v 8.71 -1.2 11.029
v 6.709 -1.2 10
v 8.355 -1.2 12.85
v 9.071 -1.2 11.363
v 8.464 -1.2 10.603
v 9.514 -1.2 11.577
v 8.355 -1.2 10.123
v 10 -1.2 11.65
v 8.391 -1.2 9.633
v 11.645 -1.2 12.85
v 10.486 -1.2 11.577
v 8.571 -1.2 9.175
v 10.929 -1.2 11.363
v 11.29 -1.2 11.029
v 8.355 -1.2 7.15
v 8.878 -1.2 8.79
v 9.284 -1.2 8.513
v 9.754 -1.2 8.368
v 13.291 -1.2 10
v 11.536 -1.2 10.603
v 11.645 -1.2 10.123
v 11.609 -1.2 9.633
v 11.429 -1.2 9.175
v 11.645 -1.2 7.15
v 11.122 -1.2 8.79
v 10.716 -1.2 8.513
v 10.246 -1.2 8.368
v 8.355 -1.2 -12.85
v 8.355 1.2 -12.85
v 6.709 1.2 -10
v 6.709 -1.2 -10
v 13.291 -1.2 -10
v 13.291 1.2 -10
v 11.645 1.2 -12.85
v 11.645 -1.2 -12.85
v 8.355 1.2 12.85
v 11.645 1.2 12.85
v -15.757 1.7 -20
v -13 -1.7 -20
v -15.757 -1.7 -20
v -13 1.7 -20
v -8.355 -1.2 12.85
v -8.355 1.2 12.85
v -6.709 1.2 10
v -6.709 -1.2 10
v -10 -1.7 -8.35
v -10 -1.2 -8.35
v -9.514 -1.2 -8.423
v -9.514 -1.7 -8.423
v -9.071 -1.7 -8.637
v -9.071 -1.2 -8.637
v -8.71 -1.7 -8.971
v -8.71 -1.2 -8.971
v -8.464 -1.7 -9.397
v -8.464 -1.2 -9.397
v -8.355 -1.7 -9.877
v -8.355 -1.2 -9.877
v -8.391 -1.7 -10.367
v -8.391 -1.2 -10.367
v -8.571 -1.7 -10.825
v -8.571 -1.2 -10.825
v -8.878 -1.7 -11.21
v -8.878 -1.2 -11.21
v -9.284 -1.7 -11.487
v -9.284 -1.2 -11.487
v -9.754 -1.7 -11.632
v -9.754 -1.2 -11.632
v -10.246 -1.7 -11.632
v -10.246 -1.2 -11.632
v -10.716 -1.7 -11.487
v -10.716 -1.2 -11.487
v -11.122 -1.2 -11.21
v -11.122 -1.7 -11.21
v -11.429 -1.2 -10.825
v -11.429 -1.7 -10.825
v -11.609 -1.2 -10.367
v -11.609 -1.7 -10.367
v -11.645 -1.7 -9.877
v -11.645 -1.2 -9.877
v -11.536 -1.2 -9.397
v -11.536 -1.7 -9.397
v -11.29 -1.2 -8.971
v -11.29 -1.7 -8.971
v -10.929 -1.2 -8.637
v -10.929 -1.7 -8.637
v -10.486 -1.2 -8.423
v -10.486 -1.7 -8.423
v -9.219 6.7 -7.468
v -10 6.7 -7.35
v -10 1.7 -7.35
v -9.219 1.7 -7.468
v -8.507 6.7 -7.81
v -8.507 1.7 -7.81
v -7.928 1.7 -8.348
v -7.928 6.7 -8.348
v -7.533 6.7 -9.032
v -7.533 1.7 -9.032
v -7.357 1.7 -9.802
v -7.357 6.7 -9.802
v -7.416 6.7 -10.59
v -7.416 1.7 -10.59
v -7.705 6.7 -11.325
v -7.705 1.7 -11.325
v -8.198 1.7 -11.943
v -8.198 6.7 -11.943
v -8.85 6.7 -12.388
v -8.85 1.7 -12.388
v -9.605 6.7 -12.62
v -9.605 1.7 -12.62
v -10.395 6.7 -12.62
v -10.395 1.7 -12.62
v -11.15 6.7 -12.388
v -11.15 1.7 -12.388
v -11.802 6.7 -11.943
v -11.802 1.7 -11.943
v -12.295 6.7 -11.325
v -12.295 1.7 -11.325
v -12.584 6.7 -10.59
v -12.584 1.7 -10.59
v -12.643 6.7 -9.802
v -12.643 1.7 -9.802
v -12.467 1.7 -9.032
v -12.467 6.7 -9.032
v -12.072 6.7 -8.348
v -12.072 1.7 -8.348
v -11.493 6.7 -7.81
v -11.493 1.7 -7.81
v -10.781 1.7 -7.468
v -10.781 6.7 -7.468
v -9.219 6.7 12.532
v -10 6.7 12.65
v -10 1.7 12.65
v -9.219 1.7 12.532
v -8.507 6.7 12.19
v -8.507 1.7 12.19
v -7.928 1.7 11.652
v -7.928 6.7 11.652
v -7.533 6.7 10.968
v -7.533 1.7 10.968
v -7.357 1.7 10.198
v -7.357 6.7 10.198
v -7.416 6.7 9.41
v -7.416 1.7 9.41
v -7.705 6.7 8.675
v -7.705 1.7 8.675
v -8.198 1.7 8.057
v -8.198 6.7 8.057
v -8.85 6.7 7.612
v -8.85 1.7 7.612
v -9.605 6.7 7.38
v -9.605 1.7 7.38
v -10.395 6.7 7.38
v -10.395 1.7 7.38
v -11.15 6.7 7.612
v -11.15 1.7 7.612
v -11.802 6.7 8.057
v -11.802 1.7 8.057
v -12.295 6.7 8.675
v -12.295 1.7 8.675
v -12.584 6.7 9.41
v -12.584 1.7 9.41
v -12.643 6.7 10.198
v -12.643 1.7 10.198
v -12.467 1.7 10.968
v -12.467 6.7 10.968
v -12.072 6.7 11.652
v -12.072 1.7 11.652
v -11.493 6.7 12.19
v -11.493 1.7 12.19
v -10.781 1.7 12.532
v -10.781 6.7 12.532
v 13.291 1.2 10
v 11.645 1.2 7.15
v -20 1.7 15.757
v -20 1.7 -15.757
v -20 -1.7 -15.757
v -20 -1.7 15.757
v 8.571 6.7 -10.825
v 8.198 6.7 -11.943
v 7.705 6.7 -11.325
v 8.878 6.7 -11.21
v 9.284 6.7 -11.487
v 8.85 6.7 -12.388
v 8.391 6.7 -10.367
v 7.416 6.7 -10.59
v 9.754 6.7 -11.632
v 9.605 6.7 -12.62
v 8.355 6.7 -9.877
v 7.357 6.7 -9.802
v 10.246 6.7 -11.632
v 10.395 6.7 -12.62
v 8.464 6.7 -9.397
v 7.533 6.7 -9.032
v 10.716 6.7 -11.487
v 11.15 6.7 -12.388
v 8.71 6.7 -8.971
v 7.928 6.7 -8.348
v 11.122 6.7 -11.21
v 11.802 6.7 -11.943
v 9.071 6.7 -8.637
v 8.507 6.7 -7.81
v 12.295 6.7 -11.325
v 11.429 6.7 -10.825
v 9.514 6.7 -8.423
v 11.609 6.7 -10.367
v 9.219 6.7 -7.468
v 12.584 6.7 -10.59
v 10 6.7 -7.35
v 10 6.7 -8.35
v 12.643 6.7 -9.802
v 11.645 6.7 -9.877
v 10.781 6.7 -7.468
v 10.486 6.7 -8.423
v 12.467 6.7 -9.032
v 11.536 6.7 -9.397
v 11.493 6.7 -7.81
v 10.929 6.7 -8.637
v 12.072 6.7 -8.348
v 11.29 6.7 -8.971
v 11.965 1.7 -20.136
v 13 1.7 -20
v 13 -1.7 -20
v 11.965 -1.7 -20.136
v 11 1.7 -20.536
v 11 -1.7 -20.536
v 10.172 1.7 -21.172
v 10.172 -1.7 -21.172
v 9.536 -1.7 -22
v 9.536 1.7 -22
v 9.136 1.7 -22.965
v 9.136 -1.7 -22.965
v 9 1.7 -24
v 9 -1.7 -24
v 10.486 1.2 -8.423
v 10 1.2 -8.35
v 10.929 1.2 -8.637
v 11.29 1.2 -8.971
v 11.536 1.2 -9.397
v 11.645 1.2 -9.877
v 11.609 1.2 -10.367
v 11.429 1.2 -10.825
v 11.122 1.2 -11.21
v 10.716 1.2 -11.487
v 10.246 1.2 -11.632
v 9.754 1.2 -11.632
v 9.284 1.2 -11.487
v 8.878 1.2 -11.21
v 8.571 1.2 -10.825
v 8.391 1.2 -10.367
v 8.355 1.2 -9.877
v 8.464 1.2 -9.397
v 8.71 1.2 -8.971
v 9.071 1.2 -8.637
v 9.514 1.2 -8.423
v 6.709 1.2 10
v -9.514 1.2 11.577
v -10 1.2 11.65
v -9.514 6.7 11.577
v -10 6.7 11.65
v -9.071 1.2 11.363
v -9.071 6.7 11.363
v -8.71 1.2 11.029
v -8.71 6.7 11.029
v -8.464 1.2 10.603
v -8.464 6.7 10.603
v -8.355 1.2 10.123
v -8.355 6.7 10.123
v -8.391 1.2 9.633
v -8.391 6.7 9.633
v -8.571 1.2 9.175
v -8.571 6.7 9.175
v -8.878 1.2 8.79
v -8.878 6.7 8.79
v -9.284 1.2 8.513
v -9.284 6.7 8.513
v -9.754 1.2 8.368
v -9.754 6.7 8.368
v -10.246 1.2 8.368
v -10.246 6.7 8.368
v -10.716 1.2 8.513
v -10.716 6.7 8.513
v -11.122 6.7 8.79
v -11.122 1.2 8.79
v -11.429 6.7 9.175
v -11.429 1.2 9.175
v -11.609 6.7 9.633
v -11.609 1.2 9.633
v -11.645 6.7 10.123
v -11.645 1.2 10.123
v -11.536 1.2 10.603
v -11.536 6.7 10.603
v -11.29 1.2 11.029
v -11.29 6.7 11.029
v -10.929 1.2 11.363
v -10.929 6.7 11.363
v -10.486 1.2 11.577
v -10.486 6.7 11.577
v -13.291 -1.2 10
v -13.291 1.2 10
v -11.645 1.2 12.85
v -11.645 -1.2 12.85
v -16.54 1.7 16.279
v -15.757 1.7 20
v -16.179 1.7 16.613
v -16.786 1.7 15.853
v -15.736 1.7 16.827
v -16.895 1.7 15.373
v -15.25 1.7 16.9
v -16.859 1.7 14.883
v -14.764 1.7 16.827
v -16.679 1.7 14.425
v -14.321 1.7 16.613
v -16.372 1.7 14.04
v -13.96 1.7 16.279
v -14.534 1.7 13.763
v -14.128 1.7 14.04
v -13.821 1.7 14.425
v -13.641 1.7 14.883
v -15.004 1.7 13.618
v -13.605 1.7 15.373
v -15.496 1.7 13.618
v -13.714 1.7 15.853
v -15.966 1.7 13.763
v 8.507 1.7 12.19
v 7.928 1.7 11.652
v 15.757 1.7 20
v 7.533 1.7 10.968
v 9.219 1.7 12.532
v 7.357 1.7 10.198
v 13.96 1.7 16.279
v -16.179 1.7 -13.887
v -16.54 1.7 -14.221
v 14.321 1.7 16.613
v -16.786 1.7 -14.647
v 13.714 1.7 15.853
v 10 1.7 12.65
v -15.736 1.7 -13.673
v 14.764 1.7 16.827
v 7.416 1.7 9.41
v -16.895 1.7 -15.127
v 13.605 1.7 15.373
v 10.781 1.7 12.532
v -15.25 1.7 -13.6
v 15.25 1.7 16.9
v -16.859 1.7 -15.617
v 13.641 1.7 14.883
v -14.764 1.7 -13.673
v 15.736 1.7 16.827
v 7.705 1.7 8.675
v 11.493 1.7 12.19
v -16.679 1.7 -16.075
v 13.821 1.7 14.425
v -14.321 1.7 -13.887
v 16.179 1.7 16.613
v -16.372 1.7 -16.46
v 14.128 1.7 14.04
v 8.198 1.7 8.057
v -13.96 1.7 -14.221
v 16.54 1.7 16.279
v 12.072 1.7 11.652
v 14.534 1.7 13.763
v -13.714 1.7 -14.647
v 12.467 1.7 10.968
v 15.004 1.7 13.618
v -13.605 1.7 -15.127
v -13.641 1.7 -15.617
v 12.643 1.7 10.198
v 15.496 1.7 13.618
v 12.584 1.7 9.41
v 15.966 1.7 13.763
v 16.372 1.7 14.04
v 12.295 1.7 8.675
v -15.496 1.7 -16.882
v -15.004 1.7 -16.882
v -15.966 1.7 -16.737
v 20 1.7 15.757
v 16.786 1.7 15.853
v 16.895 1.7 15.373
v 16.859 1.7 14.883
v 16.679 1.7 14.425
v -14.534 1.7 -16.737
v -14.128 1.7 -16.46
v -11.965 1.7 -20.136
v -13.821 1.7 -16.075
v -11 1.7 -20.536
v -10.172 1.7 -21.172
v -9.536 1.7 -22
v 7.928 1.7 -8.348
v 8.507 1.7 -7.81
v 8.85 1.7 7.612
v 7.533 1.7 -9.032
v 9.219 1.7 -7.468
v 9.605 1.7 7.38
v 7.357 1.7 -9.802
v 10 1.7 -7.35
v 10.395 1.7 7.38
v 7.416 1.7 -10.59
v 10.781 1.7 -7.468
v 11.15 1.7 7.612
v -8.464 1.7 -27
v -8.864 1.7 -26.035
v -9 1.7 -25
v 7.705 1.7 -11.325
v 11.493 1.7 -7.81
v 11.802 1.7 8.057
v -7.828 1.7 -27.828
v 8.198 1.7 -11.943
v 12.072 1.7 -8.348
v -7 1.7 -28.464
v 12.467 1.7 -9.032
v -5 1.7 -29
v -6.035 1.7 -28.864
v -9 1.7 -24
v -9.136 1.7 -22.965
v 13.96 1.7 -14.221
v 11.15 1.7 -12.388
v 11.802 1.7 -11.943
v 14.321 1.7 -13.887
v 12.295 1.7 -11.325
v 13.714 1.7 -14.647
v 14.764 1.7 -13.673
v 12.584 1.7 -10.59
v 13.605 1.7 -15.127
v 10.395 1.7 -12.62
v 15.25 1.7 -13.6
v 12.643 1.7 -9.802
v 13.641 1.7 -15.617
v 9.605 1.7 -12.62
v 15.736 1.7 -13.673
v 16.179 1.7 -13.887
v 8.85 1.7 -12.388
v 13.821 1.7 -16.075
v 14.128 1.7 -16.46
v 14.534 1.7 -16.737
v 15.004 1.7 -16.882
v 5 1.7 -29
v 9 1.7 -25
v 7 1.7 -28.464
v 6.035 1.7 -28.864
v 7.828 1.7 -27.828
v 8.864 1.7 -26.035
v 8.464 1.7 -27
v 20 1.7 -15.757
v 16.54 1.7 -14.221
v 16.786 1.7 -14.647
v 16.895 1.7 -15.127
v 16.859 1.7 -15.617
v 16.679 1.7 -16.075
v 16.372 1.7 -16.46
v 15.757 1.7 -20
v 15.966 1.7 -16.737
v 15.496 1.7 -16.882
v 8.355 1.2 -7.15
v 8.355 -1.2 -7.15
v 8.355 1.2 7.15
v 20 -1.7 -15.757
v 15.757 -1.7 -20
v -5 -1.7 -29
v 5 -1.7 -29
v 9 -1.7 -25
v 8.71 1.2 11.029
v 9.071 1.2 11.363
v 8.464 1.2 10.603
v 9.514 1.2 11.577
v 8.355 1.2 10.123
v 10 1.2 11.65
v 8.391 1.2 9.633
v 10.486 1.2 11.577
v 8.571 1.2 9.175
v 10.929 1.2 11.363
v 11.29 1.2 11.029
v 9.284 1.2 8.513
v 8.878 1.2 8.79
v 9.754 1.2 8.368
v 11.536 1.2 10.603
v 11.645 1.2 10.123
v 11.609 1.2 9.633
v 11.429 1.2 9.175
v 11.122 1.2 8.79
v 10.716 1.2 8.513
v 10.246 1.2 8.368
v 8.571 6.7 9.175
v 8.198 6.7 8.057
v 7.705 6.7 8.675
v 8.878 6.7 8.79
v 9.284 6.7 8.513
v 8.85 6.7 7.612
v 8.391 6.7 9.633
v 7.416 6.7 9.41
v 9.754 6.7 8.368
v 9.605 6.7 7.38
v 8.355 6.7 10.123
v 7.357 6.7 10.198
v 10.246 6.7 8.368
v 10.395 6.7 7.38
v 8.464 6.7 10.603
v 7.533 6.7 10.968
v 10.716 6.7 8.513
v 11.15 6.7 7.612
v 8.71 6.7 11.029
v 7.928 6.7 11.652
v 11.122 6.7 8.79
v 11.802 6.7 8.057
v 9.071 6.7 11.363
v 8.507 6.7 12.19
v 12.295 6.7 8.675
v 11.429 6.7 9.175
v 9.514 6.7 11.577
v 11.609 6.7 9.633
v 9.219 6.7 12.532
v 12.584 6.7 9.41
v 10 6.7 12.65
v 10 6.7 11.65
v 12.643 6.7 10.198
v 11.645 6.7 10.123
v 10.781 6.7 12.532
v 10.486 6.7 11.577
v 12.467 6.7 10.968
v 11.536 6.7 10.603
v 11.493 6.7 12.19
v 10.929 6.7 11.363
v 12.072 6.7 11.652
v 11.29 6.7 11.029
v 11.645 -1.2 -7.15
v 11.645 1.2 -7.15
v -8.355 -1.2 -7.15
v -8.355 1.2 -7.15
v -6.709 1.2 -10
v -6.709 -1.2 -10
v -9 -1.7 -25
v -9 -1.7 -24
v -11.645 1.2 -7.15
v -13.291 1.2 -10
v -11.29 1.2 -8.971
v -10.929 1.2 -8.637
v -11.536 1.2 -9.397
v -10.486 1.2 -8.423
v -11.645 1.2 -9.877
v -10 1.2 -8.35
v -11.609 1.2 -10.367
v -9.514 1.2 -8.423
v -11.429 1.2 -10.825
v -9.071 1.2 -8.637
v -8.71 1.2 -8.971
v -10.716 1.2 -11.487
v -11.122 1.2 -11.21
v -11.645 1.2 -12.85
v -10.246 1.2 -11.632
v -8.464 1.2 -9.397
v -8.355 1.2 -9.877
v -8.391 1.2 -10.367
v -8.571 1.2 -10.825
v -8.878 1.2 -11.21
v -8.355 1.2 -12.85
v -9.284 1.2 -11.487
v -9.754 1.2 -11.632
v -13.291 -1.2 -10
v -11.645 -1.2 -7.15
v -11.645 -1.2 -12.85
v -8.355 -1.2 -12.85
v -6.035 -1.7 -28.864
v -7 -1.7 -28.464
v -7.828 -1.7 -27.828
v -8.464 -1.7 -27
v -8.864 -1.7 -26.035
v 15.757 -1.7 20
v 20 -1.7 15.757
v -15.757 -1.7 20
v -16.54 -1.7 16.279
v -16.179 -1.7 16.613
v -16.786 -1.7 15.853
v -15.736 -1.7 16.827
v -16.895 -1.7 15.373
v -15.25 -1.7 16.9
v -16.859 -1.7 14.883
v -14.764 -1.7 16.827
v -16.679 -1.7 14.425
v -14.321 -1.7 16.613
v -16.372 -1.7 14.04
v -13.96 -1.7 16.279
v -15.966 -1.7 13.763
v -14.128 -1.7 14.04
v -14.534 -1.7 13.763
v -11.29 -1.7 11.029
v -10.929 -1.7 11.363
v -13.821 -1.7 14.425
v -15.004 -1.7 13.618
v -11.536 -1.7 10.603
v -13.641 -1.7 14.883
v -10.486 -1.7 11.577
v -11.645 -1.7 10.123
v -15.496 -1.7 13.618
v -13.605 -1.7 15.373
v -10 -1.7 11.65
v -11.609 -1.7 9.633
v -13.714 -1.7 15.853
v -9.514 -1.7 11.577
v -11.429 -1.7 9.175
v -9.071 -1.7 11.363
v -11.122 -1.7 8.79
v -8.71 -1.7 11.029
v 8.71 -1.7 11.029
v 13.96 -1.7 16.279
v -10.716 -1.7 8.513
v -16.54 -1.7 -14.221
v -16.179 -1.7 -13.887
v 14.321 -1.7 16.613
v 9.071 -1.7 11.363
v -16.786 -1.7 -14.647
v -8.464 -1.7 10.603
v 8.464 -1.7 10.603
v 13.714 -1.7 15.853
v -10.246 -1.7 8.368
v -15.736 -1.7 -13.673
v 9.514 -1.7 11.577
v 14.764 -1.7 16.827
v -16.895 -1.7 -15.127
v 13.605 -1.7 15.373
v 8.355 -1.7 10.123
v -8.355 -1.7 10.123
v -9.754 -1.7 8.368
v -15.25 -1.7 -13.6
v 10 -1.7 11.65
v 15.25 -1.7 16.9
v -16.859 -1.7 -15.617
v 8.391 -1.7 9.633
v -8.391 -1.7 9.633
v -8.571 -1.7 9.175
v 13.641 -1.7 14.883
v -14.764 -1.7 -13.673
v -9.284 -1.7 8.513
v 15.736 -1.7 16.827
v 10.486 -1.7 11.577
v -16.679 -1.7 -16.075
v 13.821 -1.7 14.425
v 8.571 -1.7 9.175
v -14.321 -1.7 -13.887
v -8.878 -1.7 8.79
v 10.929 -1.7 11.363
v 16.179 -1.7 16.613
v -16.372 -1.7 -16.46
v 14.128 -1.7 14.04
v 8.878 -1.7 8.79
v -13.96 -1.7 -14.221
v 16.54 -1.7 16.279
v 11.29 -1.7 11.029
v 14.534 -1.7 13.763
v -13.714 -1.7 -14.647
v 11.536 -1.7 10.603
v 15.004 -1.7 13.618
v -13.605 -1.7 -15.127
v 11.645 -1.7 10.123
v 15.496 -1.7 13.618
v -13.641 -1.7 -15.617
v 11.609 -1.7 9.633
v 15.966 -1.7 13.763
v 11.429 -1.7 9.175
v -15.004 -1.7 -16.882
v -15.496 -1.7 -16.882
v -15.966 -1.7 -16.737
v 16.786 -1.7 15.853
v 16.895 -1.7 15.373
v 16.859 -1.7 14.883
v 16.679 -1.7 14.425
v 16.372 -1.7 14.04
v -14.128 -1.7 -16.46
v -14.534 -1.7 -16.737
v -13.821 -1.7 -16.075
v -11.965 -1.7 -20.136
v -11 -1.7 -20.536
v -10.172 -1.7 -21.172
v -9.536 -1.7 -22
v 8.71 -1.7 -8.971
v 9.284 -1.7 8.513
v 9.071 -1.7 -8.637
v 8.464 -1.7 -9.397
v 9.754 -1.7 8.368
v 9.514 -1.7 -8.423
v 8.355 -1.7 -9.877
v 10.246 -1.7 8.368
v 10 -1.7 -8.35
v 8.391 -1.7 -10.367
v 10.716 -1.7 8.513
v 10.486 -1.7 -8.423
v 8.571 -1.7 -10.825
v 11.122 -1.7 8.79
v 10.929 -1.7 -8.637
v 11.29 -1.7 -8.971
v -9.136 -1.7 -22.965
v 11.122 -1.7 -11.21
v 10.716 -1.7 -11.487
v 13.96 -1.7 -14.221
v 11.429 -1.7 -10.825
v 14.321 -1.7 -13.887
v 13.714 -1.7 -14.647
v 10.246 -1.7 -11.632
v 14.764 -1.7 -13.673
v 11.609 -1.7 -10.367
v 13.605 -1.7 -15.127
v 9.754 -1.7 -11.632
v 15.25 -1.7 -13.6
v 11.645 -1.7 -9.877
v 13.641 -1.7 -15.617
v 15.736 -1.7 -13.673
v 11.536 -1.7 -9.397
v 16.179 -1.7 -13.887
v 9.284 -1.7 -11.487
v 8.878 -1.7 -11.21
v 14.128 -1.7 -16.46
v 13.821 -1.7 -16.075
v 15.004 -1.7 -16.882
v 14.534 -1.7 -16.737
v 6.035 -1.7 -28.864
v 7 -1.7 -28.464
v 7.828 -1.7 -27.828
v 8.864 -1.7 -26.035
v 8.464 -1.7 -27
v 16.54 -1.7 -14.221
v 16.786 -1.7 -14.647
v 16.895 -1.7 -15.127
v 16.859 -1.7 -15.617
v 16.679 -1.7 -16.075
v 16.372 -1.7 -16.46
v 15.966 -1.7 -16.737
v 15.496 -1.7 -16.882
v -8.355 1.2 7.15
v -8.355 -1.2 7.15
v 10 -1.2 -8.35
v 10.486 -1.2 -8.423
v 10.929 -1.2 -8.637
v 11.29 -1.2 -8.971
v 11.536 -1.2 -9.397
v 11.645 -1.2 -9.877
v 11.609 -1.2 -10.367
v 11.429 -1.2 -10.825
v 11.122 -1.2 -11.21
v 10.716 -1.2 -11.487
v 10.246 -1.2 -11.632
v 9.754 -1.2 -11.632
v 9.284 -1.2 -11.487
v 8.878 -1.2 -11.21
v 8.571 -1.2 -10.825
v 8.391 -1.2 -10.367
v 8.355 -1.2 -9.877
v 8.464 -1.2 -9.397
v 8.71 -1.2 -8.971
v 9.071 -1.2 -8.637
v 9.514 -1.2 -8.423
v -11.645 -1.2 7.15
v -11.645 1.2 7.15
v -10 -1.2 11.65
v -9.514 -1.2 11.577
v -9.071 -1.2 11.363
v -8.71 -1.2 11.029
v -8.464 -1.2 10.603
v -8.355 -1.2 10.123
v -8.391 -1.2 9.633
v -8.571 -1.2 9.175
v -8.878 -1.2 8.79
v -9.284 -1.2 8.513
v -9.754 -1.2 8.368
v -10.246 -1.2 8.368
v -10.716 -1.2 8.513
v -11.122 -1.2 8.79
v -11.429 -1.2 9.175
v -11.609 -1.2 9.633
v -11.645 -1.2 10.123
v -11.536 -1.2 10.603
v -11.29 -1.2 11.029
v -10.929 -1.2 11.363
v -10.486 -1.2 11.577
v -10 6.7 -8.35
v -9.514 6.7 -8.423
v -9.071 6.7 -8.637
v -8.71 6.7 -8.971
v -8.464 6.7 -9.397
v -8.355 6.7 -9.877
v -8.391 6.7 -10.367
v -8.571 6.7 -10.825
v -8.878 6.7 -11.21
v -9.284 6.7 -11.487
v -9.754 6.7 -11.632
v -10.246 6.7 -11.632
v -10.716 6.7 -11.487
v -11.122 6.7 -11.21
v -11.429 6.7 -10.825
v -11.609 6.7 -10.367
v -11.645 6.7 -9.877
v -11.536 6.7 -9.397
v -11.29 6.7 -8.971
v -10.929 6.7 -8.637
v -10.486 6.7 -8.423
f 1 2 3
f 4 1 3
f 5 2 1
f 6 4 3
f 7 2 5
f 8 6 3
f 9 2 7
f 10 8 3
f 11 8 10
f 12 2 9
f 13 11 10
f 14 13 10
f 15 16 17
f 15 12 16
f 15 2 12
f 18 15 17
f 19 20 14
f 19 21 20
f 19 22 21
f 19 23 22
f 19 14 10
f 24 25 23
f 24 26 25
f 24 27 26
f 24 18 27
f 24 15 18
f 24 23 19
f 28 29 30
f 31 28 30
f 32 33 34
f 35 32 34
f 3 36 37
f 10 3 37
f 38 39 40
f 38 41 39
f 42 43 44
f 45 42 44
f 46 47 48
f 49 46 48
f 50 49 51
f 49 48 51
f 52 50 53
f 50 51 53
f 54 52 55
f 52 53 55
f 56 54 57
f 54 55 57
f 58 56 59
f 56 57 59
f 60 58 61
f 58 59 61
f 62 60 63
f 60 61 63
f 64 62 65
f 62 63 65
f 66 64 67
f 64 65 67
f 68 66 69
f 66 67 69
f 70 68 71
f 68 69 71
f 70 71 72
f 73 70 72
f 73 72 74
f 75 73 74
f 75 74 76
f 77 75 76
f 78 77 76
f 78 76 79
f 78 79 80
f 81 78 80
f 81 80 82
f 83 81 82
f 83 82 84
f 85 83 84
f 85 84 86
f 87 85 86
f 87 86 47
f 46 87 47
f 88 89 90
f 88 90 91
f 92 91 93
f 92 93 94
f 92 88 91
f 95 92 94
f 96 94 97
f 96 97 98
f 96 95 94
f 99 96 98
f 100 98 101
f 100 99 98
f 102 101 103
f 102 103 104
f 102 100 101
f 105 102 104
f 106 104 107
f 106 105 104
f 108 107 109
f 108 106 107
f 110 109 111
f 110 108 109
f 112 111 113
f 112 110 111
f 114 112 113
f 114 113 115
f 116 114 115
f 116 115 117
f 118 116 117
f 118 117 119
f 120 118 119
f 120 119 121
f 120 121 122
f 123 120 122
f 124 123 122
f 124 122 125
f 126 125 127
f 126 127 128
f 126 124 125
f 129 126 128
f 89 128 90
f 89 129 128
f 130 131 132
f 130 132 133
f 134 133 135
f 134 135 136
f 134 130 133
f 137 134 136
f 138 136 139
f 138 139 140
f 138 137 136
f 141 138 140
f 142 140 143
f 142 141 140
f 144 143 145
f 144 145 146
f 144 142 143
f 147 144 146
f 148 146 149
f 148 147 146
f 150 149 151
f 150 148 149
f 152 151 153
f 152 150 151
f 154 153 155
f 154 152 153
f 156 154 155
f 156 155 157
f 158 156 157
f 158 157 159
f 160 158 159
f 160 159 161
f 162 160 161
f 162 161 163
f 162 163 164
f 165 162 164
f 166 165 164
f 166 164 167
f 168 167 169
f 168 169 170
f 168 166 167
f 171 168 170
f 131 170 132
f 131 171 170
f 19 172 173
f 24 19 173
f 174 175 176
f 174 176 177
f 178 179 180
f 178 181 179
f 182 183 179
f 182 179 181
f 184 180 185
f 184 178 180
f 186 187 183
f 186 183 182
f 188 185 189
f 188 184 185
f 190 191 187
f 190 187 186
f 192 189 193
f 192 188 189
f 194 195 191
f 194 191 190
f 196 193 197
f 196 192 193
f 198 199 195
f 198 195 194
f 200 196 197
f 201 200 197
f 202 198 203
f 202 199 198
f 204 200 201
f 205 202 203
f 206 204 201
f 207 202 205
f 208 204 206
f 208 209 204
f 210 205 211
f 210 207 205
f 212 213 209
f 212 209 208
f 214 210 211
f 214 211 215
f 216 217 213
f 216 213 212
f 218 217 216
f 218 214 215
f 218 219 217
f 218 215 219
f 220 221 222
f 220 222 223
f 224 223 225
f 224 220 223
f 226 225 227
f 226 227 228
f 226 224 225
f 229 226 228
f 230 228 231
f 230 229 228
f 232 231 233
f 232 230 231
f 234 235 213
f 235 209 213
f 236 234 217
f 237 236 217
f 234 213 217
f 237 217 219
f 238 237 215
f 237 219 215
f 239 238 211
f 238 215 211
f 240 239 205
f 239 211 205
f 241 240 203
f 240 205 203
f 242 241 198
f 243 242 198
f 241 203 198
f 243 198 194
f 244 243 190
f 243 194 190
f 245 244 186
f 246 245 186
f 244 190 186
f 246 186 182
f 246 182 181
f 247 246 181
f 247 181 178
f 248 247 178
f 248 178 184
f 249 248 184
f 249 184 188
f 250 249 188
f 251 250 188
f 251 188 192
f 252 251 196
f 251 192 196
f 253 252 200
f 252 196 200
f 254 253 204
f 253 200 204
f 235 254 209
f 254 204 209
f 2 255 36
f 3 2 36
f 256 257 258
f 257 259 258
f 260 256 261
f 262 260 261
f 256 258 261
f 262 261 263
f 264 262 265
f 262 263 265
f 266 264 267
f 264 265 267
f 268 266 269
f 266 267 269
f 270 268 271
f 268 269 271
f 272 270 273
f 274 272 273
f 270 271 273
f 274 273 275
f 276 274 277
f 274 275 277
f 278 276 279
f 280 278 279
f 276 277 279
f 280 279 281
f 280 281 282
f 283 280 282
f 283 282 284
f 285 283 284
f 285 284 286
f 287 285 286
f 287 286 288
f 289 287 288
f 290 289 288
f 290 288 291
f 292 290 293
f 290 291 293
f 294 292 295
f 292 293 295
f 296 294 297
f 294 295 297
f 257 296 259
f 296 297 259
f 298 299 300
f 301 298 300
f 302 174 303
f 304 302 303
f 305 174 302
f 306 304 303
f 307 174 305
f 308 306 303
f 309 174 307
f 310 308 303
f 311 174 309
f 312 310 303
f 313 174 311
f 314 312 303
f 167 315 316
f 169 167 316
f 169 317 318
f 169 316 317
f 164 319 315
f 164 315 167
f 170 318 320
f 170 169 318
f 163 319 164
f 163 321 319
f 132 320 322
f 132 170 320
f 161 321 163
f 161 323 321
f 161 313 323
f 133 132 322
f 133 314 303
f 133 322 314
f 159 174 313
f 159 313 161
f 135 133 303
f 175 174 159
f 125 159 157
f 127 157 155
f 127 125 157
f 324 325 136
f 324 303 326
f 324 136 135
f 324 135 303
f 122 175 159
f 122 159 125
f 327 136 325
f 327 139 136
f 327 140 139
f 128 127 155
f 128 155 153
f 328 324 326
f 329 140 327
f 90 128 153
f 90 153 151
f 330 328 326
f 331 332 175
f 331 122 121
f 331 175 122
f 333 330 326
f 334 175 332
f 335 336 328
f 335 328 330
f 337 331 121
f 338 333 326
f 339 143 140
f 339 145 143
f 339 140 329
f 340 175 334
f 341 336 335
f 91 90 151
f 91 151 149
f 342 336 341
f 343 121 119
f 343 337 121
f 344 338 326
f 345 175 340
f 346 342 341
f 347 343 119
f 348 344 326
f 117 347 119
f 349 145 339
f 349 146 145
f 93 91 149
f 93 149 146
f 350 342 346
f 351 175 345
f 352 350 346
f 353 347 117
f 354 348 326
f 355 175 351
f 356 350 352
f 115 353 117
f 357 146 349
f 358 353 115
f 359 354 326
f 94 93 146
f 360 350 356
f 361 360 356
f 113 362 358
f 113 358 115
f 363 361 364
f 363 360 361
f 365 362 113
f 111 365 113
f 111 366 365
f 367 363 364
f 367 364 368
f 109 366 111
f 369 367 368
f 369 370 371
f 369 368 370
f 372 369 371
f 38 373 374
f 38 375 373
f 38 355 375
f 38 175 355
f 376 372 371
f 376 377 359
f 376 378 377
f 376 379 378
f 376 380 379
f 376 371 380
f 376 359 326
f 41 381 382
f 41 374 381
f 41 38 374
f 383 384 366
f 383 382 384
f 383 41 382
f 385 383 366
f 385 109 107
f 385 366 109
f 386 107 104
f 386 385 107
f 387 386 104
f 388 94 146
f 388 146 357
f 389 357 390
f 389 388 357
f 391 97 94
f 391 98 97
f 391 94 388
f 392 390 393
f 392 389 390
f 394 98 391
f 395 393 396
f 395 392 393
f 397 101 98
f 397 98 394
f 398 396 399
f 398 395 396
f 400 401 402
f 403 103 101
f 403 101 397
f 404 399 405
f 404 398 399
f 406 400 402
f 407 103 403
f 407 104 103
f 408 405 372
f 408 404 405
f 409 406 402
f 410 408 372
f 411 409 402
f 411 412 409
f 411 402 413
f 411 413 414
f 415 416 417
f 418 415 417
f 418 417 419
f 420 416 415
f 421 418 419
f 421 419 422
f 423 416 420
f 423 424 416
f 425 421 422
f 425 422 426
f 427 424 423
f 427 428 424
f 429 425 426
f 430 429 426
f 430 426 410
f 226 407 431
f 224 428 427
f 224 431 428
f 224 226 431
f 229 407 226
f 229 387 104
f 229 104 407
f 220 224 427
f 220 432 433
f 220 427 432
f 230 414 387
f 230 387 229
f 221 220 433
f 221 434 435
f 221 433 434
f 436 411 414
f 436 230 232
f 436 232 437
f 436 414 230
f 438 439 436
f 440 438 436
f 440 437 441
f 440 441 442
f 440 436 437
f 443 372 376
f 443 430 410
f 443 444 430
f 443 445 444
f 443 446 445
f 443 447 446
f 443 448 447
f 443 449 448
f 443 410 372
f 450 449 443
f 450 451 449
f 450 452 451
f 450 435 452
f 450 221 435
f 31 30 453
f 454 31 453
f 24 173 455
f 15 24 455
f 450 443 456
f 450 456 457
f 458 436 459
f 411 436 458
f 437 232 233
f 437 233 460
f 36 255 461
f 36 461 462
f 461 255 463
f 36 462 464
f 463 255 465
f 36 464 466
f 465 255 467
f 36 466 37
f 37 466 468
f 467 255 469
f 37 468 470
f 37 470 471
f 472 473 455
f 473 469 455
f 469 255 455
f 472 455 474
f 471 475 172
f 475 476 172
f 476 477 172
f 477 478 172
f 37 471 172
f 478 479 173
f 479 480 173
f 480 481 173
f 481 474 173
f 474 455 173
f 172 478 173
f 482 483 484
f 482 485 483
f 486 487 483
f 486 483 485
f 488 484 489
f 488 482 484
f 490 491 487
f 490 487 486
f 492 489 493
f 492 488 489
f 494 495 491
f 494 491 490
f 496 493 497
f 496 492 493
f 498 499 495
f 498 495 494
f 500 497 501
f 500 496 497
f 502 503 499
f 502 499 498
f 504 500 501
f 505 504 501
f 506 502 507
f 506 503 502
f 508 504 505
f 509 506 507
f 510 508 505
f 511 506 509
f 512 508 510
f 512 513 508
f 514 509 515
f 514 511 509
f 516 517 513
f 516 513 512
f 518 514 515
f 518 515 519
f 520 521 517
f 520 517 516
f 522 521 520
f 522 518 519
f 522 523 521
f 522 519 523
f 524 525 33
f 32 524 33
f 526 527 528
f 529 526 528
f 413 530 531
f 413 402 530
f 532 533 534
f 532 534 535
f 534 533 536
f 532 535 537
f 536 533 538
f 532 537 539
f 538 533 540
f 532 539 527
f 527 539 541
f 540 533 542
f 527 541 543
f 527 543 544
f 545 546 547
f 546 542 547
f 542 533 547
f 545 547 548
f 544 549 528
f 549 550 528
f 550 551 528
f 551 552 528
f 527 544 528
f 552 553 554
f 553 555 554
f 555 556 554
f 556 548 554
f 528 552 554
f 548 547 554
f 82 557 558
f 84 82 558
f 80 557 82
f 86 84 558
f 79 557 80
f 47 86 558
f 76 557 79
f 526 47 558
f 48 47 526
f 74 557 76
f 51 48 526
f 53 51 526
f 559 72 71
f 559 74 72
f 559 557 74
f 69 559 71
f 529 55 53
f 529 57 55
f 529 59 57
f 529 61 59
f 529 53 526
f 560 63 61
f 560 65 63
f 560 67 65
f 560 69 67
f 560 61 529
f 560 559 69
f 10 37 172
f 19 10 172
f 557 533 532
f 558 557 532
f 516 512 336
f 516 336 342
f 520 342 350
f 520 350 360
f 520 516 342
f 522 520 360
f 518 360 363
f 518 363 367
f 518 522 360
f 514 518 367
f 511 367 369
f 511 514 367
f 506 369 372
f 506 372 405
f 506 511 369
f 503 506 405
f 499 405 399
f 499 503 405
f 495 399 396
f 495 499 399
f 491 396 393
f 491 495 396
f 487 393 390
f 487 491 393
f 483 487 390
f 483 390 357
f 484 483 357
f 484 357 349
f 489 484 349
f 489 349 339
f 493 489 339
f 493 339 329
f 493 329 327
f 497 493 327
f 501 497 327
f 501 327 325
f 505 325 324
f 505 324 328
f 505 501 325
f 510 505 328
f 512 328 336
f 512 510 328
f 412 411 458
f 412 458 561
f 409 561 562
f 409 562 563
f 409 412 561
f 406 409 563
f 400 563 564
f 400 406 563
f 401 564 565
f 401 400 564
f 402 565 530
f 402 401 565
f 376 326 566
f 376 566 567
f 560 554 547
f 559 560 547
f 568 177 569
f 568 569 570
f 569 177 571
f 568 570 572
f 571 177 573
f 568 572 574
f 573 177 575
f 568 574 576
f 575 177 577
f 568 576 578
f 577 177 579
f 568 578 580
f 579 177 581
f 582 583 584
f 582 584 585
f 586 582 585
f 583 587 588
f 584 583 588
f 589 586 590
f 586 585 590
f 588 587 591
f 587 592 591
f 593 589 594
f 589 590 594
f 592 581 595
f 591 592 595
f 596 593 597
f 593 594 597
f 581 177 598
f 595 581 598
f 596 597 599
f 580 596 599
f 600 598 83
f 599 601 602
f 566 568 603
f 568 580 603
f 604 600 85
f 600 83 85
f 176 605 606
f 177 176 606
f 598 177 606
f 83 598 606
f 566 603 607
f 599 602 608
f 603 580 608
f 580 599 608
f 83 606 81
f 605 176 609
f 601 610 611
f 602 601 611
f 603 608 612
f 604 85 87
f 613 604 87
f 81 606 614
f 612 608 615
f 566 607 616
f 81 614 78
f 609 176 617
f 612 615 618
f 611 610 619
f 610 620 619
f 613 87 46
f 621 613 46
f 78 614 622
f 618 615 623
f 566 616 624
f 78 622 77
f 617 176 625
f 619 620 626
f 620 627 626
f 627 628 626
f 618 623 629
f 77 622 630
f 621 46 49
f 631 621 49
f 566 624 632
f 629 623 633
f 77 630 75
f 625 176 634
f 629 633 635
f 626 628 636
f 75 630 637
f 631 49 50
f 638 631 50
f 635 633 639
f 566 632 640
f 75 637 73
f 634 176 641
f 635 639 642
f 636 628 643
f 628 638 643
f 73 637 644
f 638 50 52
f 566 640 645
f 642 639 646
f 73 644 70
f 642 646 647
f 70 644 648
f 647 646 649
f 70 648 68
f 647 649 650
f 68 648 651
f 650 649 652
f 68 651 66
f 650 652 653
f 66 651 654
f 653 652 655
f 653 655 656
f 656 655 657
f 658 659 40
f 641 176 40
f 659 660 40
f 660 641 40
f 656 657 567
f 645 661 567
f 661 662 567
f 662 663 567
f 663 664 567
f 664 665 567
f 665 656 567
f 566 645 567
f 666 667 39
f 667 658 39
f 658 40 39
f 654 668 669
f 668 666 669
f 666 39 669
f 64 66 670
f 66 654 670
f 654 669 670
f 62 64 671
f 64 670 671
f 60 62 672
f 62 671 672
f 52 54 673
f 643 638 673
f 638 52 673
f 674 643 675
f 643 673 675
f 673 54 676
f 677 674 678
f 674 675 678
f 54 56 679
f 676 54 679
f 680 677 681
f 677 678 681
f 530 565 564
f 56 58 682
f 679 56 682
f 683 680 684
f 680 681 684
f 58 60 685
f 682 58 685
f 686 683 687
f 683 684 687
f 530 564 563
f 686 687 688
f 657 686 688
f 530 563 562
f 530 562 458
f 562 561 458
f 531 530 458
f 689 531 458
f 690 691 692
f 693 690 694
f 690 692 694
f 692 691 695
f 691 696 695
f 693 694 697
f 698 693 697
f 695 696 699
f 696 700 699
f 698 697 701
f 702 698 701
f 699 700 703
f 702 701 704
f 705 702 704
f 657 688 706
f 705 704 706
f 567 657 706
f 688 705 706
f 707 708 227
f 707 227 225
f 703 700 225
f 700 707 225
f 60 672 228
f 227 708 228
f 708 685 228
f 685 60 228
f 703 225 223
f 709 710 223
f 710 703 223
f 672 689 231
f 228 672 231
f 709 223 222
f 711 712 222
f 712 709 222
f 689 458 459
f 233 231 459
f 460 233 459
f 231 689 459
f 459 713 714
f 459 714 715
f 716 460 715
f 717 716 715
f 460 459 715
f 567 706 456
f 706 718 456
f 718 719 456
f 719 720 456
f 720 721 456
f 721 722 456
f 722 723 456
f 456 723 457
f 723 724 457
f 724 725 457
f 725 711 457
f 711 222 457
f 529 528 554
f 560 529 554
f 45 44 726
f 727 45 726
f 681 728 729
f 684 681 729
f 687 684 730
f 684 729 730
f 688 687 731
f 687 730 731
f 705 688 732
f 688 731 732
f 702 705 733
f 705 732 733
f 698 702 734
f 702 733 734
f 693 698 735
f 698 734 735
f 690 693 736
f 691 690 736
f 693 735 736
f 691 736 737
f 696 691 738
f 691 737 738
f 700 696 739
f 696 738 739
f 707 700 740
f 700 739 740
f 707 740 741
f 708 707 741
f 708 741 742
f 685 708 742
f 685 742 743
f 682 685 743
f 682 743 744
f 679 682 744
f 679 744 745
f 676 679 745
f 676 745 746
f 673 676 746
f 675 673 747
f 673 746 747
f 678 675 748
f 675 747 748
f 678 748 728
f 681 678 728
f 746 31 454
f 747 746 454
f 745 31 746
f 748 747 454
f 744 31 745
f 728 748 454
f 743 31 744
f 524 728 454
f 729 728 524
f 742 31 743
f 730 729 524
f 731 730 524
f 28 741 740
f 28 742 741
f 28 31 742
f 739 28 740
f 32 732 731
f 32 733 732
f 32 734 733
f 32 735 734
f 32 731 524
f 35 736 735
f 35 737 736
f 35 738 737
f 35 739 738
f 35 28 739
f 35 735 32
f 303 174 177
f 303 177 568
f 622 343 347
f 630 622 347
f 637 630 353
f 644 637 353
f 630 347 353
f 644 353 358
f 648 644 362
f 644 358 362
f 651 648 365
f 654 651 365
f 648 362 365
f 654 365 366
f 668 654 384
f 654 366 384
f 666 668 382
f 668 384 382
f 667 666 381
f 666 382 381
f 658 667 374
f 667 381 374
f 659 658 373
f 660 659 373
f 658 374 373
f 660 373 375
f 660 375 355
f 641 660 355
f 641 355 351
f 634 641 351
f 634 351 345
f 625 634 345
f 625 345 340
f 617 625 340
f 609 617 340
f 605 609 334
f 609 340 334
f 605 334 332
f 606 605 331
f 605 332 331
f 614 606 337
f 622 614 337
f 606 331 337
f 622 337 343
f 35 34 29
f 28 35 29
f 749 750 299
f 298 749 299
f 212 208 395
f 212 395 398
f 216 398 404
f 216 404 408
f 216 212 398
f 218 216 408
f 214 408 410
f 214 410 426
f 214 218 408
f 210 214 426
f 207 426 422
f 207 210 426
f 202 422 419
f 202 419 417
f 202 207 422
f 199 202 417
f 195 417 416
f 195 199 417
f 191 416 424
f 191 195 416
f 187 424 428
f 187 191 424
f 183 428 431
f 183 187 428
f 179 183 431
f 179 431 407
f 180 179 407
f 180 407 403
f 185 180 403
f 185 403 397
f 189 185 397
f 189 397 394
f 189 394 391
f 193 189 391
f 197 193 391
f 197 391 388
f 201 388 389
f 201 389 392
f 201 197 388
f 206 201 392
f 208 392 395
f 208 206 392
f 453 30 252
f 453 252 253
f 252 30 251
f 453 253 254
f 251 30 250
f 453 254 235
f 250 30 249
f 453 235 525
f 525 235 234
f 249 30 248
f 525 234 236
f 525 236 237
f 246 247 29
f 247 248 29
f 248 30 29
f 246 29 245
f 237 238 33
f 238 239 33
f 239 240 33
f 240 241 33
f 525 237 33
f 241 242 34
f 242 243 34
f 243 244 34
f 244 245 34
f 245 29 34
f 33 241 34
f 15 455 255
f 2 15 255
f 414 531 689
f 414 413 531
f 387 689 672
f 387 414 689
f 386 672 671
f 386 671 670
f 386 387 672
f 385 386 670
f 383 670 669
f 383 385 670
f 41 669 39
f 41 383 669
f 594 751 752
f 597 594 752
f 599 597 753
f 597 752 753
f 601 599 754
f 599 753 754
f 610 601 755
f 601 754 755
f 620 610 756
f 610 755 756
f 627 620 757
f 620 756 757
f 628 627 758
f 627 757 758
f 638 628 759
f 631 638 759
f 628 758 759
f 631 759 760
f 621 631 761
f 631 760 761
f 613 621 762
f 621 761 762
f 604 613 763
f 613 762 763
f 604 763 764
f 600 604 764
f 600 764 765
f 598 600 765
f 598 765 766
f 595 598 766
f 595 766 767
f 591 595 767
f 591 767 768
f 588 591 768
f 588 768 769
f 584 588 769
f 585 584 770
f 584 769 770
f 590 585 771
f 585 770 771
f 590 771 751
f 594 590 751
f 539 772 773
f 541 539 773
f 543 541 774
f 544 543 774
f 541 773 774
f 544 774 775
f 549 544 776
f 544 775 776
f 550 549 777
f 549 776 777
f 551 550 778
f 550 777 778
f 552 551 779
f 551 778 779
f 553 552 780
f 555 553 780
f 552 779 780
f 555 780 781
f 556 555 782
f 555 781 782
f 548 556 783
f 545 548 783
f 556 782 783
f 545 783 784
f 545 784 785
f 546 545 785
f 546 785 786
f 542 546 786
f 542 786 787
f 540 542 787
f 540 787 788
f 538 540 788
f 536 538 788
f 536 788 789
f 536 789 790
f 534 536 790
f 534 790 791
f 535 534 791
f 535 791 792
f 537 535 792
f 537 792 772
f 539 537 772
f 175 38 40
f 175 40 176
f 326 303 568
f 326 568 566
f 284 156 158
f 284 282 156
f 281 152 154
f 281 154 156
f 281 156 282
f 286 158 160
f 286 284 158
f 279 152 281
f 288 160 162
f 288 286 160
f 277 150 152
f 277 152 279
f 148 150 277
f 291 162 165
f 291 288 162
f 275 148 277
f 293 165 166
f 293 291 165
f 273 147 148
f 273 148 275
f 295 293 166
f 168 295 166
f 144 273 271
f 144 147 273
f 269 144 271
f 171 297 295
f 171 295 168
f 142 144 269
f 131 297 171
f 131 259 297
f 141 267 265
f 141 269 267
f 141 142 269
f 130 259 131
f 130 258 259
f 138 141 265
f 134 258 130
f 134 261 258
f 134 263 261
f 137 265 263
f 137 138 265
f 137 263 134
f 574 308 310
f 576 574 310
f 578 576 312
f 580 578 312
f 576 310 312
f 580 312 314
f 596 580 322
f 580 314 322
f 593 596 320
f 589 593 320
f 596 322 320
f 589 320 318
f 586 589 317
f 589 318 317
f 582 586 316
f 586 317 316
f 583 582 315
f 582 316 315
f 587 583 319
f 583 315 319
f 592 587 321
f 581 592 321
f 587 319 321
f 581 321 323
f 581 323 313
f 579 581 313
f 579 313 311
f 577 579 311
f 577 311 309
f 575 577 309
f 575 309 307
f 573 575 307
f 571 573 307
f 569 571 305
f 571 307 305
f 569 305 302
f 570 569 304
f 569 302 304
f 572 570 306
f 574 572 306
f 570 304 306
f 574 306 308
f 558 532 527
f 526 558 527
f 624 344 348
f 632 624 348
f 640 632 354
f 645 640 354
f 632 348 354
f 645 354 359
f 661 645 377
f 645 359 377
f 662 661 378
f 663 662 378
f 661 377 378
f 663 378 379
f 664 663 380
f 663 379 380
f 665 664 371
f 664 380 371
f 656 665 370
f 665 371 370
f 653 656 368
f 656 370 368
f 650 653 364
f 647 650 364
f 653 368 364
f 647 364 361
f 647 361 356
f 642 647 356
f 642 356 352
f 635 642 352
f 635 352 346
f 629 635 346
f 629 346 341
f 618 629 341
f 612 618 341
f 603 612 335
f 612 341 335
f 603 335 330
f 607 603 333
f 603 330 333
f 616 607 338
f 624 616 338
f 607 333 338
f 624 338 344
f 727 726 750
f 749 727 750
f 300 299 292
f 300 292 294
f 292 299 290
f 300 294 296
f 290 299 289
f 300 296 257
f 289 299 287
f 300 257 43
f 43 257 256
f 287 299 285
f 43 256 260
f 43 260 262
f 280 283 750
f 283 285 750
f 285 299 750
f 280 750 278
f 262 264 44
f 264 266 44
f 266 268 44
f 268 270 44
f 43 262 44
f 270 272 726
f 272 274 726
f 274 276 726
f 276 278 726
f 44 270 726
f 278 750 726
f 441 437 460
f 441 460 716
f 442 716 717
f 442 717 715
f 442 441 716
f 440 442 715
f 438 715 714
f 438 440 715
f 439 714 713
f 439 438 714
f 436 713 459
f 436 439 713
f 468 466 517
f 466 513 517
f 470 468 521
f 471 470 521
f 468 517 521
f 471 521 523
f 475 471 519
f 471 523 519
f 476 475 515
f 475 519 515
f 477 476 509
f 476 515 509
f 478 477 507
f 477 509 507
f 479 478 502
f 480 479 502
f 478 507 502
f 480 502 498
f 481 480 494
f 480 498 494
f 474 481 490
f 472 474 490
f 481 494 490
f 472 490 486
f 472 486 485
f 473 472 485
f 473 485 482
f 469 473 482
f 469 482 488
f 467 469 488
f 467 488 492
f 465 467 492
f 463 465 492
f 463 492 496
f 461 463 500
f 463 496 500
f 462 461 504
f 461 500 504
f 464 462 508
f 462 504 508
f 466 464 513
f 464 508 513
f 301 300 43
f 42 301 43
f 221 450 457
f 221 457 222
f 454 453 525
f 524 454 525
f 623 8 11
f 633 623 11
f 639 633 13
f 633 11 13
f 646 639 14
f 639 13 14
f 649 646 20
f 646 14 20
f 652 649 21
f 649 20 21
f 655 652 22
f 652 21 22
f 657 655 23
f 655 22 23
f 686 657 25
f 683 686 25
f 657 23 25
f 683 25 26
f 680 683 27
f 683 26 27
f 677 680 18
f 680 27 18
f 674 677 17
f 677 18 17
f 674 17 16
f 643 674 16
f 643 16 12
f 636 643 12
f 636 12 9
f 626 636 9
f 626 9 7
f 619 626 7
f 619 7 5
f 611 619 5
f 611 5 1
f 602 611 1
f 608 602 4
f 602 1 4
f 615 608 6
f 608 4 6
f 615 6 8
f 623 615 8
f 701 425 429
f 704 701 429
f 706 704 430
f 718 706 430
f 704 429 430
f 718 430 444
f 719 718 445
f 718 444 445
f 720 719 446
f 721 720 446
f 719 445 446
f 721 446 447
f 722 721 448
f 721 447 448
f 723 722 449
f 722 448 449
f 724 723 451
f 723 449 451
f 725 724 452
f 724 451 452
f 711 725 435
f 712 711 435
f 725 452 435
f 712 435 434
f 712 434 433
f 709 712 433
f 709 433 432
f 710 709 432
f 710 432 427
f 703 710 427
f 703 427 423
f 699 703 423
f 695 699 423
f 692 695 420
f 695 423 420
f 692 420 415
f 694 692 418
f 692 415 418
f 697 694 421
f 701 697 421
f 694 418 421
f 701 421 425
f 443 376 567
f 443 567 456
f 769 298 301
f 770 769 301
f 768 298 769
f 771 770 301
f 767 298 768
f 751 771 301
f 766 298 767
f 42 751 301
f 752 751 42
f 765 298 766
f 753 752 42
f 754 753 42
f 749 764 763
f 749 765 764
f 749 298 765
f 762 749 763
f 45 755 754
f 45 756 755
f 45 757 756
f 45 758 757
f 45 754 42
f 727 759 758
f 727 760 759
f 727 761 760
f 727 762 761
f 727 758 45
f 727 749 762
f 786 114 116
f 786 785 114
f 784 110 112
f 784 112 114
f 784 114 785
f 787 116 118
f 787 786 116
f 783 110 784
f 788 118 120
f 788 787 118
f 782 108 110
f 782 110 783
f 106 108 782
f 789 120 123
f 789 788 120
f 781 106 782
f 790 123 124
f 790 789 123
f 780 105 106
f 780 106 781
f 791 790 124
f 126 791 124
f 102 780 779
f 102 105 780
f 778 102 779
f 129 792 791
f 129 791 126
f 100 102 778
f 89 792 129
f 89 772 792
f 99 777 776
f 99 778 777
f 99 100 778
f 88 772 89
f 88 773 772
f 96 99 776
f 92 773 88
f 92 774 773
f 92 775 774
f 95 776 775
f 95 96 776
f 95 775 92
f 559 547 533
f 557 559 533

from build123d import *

# Parameters (mm, degrees)
BOSS_EXTRUDE1_DEPTH = 1.7
SKETCH2_R           = 1.65
CUT_EXTRUDE1_DEPTH  = 3.4
BOSS_EXTRUDE2_START = 5
SKETCH3_R           = 2.65
SKETCH3_R_2         = 1.65
BOSS_EXTRUDE2_DEPTH = 5
CUT_EXTRUDE2_START  = -0.5
CUT_EXTRUDE2_DEPTH  = 2.4


with BuildPart() as part:
    # Sketch1 → Boss-Extrude1 (new, symmetric)
    with BuildSketch(Plane(origin=(0, 0, 0), x_dir=(1, 0, 0), z_dir=(0, 1, 0))):
        with BuildLine():
            Line((-13, 20), (-15.757359313, 20))
            Line((-15.757359313, 20), (-20, 15.757359313))
            Line((-20, 15.757359313), (-20, -15.757359313))
            Line((-20, -15.757359313), (-15.757359313, -20))
            Line((-15.757359313, -20), (15.757359313, -20))
            Line((15.757359313, -20), (20, -15.757359313))
            Line((20, -15.757359313), (20, 15.757359313))
            Line((20, 15.757359313), (15.757359313, 20))
            Line((15.757359313, 20), (13, 20))
            ThreePointArc((13, 20), (10.171572875, 21.171572875), (9, 24))
            Line((9, 24), (9, 25))
            ThreePointArc((9, 25), (7.828427125, 27.828427125), (5, 29))
            Line((5, 29), (-5, 29))
            ThreePointArc((-5, 29), (-7.828427125, 27.828427125), (-9, 25))
            Line((-9, 25), (-9, 24))
            ThreePointArc((-9, 24), (-10.171572875, 21.171572875), (-13, 20))
        make_face()
    extrude(amount=BOSS_EXTRUDE1_DEPTH, both=True)

    # Sketch2 → Cut-Extrude1 (cut)
    with BuildSketch(Plane(origin=(0, 1.7, 0), x_dir=(1, 0, 0), z_dir=(0, 1, 0))):
        with Locations(Location((-10, 10, 0), (0, 0, 270))):
            Circle(SKETCH2_R)
        with Locations(Location((10, 10, 0), (0, 0, 270))):
            Circle(SKETCH2_R)
        with Locations(Location((-10, -10, 0), (0, 0, 270))):
            Circle(SKETCH2_R)
        with Locations(Location((10, -10, 0), (0, 0, 270))):
            Circle(SKETCH2_R)
        with Locations(Location((-15.25, -15.25, 0), (0, 0, 270))):
            Circle(SKETCH2_R)
        with Locations(Location((-15.25, 15.25, 0), (0, 0, 270))):
            Circle(SKETCH2_R)
        with Locations(Location((15.25, 15.25, 0), (0, 0, 270))):
            Circle(SKETCH2_R)
        with Locations(Location((15.25, -15.25, 0), (0, 0, 270))):
            Circle(SKETCH2_R)
    extrude(amount=-CUT_EXTRUDE1_DEPTH, mode=Mode.SUBTRACT)

    # Sketch3 → Boss-Extrude2 (add)
    # profile 1 of 4: a face of its own
    with BuildSketch(Plane(origin=(0, 1.7, 0), x_dir=(1, 0, 0), z_dir=(0, 1, 0)).offset(BOSS_EXTRUDE2_START)):
        with Locations(Location((-10, 10, 0), (0, 0, 270))):
            Circle(SKETCH3_R)
        with Locations(Location((-10, 10, 0), (0, 0, 270))):
            Circle(SKETCH3_R_2, mode=Mode.SUBTRACT)
    # profile 2 of 4: a face of its own
    with BuildSketch(Plane(origin=(0, 1.7, 0), x_dir=(1, 0, 0), z_dir=(0, 1, 0)).offset(BOSS_EXTRUDE2_START)):
        with Locations(Location((10, 10, 0), (0, 0, 270))):
            Circle(SKETCH3_R)
        with Locations(Location((10, 10, 0), (0, 0, 270))):
            Circle(SKETCH3_R_2, mode=Mode.SUBTRACT)
    # profile 3 of 4: a face of its own
    with BuildSketch(Plane(origin=(0, 1.7, 0), x_dir=(1, 0, 0), z_dir=(0, 1, 0)).offset(BOSS_EXTRUDE2_START)):
        with Locations(Location((10, -10, 0), (0, 0, 270))):
            Circle(SKETCH3_R)
        with Locations(Location((10, -10, 0), (0, 0, 270))):
            Circle(SKETCH3_R_2, mode=Mode.SUBTRACT)
    # profile 4 of 4: a face of its own
    with BuildSketch(Plane(origin=(0, 1.7, 0), x_dir=(1, 0, 0), z_dir=(0, 1, 0)).offset(BOSS_EXTRUDE2_START)):
        with Locations(Location((-10, -10, 0), (0, 0, 270))):
            Circle(SKETCH3_R)
        with Locations(Location((-10, -10, 0), (0, 0, 270))):
            Circle(SKETCH3_R_2, mode=Mode.SUBTRACT)
    extrude(amount=-BOSS_EXTRUDE2_DEPTH)

    # Sketch4 → Cut-Extrude2 (cut)
    with BuildSketch(Plane(origin=(0, 1.7, 0), x_dir=(1, 0, 0), z_dir=(0, 1, 0)).offset(CUT_EXTRUDE2_START)):
        Polygon((-6.709103466, 10), (-8.354551733, 12.85), (-11.645448267, 12.85), (-13.290896534, 10), (-11.645448267, 7.15), (-8.354551733, 7.15), align=None)
        Polygon((13.290896534, 10), (11.645448267, 12.85), (8.354551733, 12.85), (6.709103466, 10), (8.354551733, 7.15), (11.645448267, 7.15), align=None)
        Polygon((13.290896534, -10), (11.645448267, -7.15), (8.354551733, -7.15), (6.709103466, -10), (8.354551733, -12.85), (11.645448267, -12.85), align=None)
        Polygon((-6.709103466, -10), (-8.354551733, -7.15), (-11.645448267, -7.15), (-13.290896534, -10), (-11.645448267, -12.85), (-8.354551733, -12.85), align=None)
    extrude(amount=-CUT_EXTRUDE2_DEPTH, mode=Mode.SUBTRACT)


solid = part.part
